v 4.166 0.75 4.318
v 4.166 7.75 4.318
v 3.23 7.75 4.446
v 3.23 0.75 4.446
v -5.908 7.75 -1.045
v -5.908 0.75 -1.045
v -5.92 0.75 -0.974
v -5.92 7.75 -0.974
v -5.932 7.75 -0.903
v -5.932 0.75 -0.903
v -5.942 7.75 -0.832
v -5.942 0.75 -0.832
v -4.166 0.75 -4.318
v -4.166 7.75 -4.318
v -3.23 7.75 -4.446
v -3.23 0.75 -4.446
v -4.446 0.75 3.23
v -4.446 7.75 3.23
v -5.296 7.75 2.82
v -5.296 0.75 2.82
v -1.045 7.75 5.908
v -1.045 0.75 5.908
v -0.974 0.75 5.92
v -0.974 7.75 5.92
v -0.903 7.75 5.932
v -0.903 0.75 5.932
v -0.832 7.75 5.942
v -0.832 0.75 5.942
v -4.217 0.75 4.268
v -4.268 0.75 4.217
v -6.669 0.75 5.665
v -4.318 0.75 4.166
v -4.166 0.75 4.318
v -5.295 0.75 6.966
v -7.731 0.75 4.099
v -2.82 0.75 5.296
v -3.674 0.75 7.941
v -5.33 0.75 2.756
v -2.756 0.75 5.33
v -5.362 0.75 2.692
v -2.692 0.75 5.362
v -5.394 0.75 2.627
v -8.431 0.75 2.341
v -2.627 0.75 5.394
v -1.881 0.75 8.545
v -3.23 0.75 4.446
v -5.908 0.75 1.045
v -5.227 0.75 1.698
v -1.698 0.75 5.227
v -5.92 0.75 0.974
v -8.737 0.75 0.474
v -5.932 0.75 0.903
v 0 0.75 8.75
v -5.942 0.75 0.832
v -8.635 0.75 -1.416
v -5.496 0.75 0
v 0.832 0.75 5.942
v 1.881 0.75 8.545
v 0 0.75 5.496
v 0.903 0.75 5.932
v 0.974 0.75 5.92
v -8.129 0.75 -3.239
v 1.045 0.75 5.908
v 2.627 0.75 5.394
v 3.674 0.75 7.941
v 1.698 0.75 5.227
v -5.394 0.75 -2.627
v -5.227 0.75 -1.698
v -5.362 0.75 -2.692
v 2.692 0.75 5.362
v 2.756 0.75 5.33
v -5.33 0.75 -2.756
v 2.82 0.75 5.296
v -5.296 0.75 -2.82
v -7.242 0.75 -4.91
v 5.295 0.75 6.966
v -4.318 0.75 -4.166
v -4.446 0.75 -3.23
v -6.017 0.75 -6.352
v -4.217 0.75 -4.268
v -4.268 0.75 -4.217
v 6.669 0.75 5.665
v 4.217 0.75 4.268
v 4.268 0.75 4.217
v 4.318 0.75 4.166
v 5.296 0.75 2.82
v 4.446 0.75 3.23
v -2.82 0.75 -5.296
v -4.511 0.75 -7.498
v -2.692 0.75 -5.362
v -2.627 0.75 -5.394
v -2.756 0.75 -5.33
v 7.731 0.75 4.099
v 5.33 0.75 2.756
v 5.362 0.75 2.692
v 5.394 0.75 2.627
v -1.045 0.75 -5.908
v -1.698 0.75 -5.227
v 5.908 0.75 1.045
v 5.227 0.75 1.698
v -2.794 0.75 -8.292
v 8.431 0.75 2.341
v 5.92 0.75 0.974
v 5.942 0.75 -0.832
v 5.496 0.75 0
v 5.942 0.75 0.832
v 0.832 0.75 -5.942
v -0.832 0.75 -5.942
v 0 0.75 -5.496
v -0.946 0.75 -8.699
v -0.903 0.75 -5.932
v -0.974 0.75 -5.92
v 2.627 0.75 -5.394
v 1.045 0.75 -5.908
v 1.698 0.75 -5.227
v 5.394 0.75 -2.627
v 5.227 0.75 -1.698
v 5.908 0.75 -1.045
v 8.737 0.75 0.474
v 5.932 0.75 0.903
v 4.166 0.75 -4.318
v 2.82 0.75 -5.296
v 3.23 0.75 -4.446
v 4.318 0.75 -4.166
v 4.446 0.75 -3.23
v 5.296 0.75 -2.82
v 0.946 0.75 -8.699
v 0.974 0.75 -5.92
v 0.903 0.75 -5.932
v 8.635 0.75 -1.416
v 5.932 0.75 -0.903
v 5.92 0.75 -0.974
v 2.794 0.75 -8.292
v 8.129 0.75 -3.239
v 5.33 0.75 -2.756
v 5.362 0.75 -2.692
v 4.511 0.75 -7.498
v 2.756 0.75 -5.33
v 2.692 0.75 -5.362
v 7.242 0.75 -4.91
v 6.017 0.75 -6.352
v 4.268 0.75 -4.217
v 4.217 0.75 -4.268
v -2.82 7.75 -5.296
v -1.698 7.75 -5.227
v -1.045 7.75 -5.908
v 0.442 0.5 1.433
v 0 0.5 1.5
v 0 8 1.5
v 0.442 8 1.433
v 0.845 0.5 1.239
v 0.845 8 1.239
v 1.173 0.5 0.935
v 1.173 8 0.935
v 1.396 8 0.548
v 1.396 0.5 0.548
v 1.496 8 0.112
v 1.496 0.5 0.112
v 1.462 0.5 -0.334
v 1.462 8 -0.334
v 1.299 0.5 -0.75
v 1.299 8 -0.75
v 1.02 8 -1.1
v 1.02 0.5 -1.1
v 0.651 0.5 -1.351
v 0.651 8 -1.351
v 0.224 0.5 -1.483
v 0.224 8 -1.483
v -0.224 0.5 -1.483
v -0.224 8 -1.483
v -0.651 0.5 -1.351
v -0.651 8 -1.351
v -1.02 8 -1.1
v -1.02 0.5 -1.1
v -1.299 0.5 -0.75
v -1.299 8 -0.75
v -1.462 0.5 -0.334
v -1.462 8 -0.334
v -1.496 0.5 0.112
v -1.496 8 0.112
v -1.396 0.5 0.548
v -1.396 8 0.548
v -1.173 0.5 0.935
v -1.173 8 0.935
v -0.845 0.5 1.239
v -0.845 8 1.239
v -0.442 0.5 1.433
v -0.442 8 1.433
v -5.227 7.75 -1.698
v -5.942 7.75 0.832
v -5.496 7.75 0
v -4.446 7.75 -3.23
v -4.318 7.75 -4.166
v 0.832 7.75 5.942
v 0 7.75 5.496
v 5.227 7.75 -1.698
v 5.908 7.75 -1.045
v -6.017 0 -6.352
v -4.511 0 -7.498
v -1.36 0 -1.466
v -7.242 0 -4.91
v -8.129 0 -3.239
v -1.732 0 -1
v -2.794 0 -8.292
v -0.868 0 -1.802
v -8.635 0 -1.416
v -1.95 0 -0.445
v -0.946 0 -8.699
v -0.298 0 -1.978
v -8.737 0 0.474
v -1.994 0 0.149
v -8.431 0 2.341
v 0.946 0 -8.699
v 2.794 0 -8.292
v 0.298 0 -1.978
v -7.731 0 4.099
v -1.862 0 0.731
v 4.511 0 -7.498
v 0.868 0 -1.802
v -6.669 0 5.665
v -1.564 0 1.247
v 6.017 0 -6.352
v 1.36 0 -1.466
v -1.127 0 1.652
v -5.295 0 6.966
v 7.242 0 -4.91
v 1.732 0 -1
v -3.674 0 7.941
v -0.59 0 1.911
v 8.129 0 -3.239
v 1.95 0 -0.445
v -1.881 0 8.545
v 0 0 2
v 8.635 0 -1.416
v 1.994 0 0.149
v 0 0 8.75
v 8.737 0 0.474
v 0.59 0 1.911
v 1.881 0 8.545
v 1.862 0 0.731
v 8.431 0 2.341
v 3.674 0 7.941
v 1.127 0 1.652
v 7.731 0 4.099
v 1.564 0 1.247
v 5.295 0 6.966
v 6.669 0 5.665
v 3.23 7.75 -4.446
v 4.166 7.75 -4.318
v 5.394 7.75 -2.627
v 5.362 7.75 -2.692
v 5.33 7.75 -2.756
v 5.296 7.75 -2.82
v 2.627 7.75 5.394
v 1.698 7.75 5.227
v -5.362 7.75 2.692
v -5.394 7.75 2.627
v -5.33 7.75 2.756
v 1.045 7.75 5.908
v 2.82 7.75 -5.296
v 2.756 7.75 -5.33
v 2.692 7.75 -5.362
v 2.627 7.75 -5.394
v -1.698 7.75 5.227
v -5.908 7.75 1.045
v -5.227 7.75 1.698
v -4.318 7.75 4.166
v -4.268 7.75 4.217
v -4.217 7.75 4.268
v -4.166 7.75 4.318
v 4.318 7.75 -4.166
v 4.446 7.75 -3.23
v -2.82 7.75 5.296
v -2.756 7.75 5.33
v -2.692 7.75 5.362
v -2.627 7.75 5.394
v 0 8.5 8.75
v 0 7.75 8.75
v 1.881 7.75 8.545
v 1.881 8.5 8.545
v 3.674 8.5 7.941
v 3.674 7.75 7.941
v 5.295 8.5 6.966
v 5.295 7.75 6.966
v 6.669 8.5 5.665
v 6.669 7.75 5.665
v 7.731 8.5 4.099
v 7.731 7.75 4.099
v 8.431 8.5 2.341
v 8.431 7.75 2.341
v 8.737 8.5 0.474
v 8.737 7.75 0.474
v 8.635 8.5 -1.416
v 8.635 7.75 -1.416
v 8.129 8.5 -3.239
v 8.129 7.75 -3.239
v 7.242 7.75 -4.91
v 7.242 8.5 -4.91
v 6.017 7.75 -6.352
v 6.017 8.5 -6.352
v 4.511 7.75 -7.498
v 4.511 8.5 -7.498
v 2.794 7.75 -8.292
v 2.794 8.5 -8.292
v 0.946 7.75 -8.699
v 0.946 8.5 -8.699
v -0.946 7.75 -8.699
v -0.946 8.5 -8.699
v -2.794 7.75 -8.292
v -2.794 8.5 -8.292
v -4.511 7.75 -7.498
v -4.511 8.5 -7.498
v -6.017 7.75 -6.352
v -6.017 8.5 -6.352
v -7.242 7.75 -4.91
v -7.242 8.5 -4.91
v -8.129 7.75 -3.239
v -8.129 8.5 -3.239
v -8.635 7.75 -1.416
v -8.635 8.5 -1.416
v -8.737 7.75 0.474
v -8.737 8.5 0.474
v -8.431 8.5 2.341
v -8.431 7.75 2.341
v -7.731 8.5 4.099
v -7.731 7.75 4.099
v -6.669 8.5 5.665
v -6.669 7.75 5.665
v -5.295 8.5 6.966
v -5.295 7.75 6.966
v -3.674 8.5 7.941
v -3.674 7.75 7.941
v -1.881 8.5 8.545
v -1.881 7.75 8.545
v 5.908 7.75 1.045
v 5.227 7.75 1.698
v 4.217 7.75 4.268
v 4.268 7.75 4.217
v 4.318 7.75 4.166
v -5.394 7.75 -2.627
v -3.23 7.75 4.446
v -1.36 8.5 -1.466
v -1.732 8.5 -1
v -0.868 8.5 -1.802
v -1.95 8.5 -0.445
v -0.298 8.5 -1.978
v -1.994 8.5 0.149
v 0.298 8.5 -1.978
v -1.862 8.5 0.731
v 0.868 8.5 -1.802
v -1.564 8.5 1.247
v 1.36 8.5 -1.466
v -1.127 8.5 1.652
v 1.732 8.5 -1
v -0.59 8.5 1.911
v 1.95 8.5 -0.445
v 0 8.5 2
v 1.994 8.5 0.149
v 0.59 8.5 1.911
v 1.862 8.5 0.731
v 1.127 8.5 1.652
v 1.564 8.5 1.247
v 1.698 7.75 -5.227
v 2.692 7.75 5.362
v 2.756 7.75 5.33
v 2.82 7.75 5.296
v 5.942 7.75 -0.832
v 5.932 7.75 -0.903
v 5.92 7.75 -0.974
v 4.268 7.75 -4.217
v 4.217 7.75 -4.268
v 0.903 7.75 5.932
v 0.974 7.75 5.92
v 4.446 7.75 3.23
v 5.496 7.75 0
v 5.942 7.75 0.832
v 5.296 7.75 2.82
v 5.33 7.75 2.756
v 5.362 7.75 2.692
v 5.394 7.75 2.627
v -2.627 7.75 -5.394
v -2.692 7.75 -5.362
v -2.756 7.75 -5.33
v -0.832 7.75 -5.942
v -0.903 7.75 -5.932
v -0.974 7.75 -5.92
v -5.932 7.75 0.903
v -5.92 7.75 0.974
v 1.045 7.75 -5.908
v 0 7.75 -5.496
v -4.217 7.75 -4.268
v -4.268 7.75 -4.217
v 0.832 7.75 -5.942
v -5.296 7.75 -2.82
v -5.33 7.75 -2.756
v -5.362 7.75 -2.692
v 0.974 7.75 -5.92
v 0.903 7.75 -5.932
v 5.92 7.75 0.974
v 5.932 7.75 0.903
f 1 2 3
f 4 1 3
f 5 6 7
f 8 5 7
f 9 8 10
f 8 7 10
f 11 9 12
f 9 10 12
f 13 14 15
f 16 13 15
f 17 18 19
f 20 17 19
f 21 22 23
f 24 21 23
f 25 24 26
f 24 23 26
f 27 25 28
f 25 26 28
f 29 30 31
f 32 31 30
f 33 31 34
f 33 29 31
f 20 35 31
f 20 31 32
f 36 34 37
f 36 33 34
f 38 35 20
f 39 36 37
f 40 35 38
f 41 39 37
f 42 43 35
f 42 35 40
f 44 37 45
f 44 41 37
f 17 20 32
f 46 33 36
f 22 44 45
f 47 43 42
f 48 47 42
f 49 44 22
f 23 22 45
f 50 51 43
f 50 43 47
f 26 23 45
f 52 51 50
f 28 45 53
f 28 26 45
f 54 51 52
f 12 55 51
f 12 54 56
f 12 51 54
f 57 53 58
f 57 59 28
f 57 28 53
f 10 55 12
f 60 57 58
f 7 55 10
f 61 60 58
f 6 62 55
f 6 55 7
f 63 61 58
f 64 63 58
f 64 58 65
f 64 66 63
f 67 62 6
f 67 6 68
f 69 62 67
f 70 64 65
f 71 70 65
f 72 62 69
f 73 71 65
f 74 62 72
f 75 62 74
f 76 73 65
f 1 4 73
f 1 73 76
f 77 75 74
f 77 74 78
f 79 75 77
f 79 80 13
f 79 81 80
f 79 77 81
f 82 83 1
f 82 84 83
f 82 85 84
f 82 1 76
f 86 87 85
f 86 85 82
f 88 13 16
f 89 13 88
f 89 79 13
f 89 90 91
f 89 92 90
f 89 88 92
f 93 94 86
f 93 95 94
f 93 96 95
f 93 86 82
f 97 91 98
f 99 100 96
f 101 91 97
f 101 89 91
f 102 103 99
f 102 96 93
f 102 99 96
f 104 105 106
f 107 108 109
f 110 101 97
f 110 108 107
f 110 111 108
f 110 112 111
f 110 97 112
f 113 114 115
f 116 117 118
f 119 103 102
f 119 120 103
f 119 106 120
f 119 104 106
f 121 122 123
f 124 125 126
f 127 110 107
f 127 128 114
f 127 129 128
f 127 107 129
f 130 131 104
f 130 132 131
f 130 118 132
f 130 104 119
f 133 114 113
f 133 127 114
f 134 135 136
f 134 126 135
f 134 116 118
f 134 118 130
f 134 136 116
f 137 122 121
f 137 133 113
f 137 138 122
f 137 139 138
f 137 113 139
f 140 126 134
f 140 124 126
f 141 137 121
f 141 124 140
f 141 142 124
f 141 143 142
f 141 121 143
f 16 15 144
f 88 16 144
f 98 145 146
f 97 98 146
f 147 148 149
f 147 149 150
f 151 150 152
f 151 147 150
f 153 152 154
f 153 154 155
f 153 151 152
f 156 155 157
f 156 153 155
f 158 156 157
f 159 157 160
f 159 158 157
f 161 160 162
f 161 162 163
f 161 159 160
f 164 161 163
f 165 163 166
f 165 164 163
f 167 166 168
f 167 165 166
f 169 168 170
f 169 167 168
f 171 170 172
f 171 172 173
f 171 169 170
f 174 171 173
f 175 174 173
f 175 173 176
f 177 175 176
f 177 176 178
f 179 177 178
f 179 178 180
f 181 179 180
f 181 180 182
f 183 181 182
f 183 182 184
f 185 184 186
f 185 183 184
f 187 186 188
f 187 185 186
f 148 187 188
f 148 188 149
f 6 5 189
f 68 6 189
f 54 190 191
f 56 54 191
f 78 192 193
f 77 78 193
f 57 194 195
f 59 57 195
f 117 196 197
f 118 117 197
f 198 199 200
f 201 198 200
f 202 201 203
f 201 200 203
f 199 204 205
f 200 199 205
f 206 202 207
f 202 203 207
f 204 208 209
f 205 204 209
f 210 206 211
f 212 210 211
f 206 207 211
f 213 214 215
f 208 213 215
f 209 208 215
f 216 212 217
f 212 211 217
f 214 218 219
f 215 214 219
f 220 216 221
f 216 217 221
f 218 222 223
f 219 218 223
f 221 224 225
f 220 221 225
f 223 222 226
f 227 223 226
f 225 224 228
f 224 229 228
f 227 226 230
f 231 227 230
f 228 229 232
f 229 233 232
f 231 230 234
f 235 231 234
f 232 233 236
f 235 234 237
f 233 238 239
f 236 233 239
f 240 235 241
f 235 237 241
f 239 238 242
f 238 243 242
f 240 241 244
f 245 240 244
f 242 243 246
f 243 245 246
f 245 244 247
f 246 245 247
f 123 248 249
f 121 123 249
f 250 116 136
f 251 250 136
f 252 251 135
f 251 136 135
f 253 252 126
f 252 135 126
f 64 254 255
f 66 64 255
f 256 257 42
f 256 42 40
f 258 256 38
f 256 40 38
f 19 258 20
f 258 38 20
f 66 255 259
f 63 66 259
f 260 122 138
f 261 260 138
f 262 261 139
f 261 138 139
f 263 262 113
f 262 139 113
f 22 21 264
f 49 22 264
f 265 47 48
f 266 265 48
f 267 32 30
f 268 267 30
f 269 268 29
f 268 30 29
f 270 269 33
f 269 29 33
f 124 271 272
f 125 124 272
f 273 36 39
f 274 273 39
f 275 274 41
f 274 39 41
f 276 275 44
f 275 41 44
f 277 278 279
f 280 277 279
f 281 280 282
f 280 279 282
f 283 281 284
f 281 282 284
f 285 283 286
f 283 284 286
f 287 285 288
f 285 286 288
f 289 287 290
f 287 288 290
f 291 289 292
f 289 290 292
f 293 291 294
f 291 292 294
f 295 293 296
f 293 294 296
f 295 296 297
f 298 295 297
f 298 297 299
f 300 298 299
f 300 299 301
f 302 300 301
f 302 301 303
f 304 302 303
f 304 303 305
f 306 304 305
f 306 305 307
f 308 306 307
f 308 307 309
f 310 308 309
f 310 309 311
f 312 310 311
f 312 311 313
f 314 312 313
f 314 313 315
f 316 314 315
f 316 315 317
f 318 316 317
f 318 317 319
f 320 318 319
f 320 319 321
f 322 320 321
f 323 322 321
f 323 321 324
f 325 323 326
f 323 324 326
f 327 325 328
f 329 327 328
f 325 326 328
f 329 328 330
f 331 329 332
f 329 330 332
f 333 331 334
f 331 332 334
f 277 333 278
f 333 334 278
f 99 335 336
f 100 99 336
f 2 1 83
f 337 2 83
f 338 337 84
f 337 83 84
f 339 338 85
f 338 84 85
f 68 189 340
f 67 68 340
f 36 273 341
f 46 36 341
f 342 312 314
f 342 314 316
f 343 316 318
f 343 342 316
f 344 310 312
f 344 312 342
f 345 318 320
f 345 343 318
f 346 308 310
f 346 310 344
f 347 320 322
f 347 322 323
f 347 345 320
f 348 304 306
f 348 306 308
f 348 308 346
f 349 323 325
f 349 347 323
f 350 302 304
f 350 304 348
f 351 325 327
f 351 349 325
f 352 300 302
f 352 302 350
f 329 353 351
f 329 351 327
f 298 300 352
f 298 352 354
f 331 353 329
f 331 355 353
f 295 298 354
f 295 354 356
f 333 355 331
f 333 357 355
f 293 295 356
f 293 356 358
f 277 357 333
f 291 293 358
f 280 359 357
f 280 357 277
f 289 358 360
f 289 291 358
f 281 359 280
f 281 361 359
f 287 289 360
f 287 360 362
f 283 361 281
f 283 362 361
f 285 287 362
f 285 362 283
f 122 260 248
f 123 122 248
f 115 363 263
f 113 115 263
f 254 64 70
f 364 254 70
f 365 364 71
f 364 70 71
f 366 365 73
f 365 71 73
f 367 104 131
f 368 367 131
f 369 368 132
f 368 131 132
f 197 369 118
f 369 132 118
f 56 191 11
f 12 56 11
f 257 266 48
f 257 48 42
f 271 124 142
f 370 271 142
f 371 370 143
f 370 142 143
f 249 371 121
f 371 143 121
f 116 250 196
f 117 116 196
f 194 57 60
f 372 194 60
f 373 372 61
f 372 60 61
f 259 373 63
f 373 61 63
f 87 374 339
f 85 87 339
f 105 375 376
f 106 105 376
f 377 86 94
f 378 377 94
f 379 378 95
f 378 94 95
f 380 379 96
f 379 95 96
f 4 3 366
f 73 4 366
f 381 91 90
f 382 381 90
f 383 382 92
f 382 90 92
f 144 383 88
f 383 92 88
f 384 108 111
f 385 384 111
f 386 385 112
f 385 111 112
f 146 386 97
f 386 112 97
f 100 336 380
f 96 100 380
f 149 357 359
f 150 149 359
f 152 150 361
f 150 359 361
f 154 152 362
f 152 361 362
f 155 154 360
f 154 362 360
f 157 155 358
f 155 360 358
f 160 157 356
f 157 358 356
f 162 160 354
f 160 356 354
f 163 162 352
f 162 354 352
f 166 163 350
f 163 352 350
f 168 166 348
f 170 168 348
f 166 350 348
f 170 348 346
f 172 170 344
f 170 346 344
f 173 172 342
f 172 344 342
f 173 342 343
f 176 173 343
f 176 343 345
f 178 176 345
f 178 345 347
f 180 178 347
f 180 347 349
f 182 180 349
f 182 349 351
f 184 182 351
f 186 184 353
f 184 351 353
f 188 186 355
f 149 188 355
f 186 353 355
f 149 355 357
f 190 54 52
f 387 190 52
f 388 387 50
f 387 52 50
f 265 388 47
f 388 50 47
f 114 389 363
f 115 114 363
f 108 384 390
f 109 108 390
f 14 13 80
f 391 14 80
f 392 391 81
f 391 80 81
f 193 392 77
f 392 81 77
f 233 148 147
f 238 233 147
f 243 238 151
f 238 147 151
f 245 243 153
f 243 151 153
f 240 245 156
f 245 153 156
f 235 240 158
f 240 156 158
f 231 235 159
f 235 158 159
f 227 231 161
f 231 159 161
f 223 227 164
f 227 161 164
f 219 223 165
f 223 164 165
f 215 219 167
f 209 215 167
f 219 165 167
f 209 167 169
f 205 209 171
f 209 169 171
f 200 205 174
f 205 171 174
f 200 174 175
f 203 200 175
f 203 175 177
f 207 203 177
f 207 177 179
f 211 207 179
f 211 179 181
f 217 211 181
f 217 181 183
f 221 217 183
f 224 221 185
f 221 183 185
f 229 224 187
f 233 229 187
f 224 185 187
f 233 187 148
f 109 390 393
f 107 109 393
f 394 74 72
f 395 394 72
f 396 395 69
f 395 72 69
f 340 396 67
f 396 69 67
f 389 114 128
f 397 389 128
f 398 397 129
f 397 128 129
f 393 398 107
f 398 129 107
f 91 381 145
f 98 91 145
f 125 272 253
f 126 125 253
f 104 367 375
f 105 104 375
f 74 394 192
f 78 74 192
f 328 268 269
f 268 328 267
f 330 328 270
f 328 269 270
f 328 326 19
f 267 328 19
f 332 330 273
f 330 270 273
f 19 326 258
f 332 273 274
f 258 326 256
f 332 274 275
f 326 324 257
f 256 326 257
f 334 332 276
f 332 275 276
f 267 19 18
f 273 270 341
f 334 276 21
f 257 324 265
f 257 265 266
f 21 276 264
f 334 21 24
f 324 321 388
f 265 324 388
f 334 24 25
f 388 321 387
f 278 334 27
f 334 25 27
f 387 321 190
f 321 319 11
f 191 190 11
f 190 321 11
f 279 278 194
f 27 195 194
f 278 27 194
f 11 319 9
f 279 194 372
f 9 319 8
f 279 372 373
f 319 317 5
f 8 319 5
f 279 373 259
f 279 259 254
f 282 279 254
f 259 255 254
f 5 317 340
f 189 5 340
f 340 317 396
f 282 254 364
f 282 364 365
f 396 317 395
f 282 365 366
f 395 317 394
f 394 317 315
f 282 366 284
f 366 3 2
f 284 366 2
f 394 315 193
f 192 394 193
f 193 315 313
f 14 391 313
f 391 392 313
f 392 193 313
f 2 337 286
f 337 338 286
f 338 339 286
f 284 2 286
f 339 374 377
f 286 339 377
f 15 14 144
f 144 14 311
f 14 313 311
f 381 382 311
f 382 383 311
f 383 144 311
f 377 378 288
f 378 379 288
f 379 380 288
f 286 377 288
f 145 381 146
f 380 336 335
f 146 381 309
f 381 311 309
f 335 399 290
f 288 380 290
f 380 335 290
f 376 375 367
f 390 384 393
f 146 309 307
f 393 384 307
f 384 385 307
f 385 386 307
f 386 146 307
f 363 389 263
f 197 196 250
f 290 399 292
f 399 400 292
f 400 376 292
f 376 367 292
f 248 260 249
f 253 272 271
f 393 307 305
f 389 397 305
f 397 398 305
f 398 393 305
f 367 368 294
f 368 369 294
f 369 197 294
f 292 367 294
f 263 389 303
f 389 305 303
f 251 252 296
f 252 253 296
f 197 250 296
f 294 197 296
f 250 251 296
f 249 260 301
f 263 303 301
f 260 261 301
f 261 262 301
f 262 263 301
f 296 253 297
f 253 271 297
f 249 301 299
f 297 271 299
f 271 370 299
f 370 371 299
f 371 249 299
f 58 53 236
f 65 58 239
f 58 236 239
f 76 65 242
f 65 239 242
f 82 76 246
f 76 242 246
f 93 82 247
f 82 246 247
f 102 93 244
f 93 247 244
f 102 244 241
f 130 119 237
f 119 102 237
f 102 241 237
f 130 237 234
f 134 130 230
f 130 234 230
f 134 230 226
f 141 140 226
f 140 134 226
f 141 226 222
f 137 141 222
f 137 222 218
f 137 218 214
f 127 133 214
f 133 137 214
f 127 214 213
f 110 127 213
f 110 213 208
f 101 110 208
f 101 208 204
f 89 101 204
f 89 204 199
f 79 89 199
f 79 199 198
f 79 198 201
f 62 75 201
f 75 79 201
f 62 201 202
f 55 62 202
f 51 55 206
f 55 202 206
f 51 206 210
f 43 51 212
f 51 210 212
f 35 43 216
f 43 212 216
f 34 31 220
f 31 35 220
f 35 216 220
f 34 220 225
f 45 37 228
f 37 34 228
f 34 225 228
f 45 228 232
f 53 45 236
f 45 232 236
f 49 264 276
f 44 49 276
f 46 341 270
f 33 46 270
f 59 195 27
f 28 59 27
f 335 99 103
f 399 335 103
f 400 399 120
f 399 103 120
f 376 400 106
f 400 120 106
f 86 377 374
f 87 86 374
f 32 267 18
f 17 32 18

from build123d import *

# Parameters (mm, degrees)
SKETCH1_R               = 8.75
SKETCH1_R_2             = 1.5
BOSS_EXTRUDE1_DEPTH     = 8.5
CUT_EXTRUDE2_DEPTH      = 3.5
CUT_EXTRUDE2_DEPTH_BACK = 3.5
CUT_EXTRUDE2_START      = -4.25
SKETCH2_R               = 9
SKETCH2_R_2             = 6
CUT_EXTRUDE5_START      = -0.75
CUT_EXTRUDE5_DEPTH      = 7
CHAMFER1_SIZE           = 0.5


with BuildPart() as part:
    # Sketch1 → Boss-Extrude1 (new body)
    with BuildSketch(Plane(origin=(0, 0, 0), x_dir=(1, 0, 0), z_dir=(0, 1, 0))):
        with Locations(Location((0, 0, 0), (0, 0, 270))):
            Circle(SKETCH1_R)
        with Locations(Location((0, 0, 0), (0, 0, 270))):
            Circle(SKETCH1_R_2, mode=Mode.SUBTRACT)
    extrude(amount=BOSS_EXTRUDE1_DEPTH)

    # Sketch2 → Cut-Extrude2 (cut, two sides: drawn at the far end of the back side and taken through both)
    with BuildSketch(Plane(origin=(0, 8.5, 0), x_dir=(1, 0, 0), z_dir=(0, 1, 0)).offset(CUT_EXTRUDE2_START - CUT_EXTRUDE2_DEPTH_BACK)):
        Circle(SKETCH2_R)
        with Locations(Location((0, 0, 0), (0, 0, 270))):
            Circle(SKETCH2_R_2, mode=Mode.SUBTRACT)
    extrude(amount=CUT_EXTRUDE2_DEPTH + CUT_EXTRUDE2_DEPTH_BACK, mode=Mode.SUBTRACT)

    # Sketch4 → Cut-Extrude5 (cut)
    with BuildSketch(Plane(origin=(0, 8.5, 0), x_dir=(1, 0, 0), z_dir=(0, 1, 0)).offset(CUT_EXTRUDE5_START)):
        with BuildLine():
            ThreePointArc((3.526710889, 4.85410242), (3.180827716, 5.087468432), (2.81956216, 5.296231606))
            Line((2.81956216, 5.296231606), (3.230259184, 4.44607034))
            Line((3.230259184, 4.44607034), (4.165722957, 4.318188538))
            ThreePointArc((4.165722957, 4.318188538), (3.855539591, 4.597261626), (3.526710889, 4.85410242))
        make_face()
        with BuildLine():
            ThreePointArc((4.854101297, 3.526712434), (4.597261012, 3.855540323), (4.318188538, 4.165722957))
            Line((4.318188538, 4.165722957), (4.44607034, 3.230259184))
            Line((4.44607034, 3.230259184), (5.296231606, 2.81956216))
            ThreePointArc((5.296231606, 2.81956216), (5.087467925, 3.180828525), (4.854101297, 3.526712434))
        make_face()
        with BuildLine():
            ThreePointArc((1.85410212, 5.706339048), (1.453033176, 5.821399711), (1.044937393, 5.908308205))
            Line((1.044937393, 5.908308205), (1.698247753, 5.226669153))
            Line((1.698247753, 5.226669153), (2.62744432, 5.394120535))
            ThreePointArc((2.62744432, 5.394120535), (2.246204515, 5.563682708), (1.85410212, 5.706339048))
        make_face()
        with BuildLine():
            ThreePointArc((0.831973127, 5.942038431), (0.416994825, 5.98549207), (-5.4e-08, 6))
            ThreePointArc((-5.4e-08, 6), (-0.416994879, 5.985492066), (-0.831973127, 5.942038431))
            Line((-0.831973127, 5.942038431), (0, 5.495645173))
            Line((0, 5.495645173), (0.831973127, 5.942038431))
        make_face()
        with BuildLine():
            Line((-1.698247753, 5.226669153), (-1.044937393, 5.908308205))
            ThreePointArc((-1.044937393, 5.908308205), (-1.453033133, 5.821399721), (-1.854102038, 5.706339075))
            ThreePointArc((-1.854102038, 5.706339075), (-2.246204475, 5.563682724), (-2.62744432, 5.394120535))
            Line((-2.62744432, 5.394120535), (-1.698247753, 5.226669153))
        make_face()
        with BuildLine():
            Line((-3.230259184, 4.44607034), (-2.81956216, 5.296231606))
            ThreePointArc((-2.81956216, 5.296231606), (-3.180828024, 5.087468239), (-3.526711477, 4.854101993))
            ThreePointArc((-3.526711477, 4.854101993), (-3.85553987, 4.597261392), (-4.165722957, 4.318188538))
            Line((-4.165722957, 4.318188538), (-3.230259184, 4.44607034))
        make_face()
        with BuildLine():
            Line((-4.44607034, 3.230259184), (-4.318188538, 4.165722957))
            ThreePointArc((-4.318188538, 4.165722957), (-4.597261623, 3.855539595), (-4.854102415, 3.526710897))
            ThreePointArc((-4.854102415, 3.526710897), (-5.087468429, 3.18082772), (-5.296231606, 2.81956216))
            Line((-5.296231606, 2.81956216), (-4.44607034, 3.230259184))
        make_face()
        with BuildLine():
            Line((-5.226669153, 1.698247753), (-5.394120535, 2.62744432))
            ThreePointArc((-5.394120535, 2.62744432), (-5.563682526, 2.246204966), (-5.706338747, 1.854103044))
            ThreePointArc((-5.706338747, 1.854103044), (-5.821399593, 1.453033647), (-5.908308205, 1.044937393))
            Line((-5.908308205, 1.044937393), (-5.226669153, 1.698247753))
        make_face()
        with BuildLine():
            ThreePointArc((5.70633865, 1.854103345), (5.563682467, 2.246205112), (5.394120535, 2.62744432))
            Line((5.394120535, 2.62744432), (5.226669153, 1.698247753))
            Line((5.226669153, 1.698247753), (5.908308205, 1.044937393))
            ThreePointArc((5.908308205, 1.044937393), (5.821399555, 1.4530338), (5.70633865, 1.854103345))
        make_face()
        with BuildLine():
            ThreePointArc((6, 0), (5.985492068, 0.416994852), (5.942038431, 0.831973127))
            Line((5.942038431, 0.831973127), (5.495645173, 0))
            Line((5.495645173, 0), (5.942038431, -0.831973127))
            ThreePointArc((5.942038431, -0.831973127), (5.985492068, -0.416994852), (6, 0))
        make_face()
        with BuildLine():
            ThreePointArc((5.706339698, -1.854100118), (5.821399966, -1.453032154), (5.908308205, -1.044937393))
            Line((5.908308205, -1.044937393), (5.226669153, -1.698247753))
            Line((5.226669153, -1.698247753), (5.394120535, -2.62744432))
            ThreePointArc((5.394120535, -2.62744432), (5.563683102, -2.246203539), (5.706339698, -1.854100118))
        make_face()
        with BuildLine():
            Line((-5.495645173, 0), (-5.942038431, 0.831973127))
            ThreePointArc((-5.942038431, 0.831973127), (-5.985492068, 0.416994852), (-6, 0))
            ThreePointArc((-6, 0), (-5.985492068, -0.416994852), (-5.942038431, -0.831973127))
            Line((-5.942038431, -0.831973127), (-5.495645173, 0))
        make_face()
        with BuildLine():
            Line((-4.44607034, -3.230259184), (-5.296231606, -2.81956216))
            ThreePointArc((-5.296231606, -2.81956216), (-5.087467714, -3.180828864), (-4.854100828, -3.526713081))
            ThreePointArc((-4.854100828, -3.526713081), (-4.597260756, -3.855540629), (-4.318188538, -4.165722957))
            Line((-4.318188538, -4.165722957), (-4.44607034, -3.230259184))
        make_face()
        with BuildLine():
            Line((-3.230259184, -4.44607034), (-4.165722957, -4.318188538))
            ThreePointArc((-4.165722957, -4.318188538), (-3.855540695, -4.5972607), (-3.52671322, -4.854100727))
            ThreePointArc((-3.52671322, -4.854100727), (-3.180828937, -5.087467668), (-2.81956216, -5.296231606))
            Line((-2.81956216, -5.296231606), (-3.230259184, -4.44607034))
        make_face()
        with BuildLine():
            Line((-1.698247753, -5.226669153), (-2.62744432, -5.394120535))
            ThreePointArc((-2.62744432, -5.394120535), (-2.246203408, -5.563683155), (-1.854099848, -5.706339786))
            ThreePointArc((-1.854099848, -5.706339786), (-1.453032017, -5.8214), (-1.044937393, -5.908308205))
            Line((-1.044937393, -5.908308205), (-1.698247753, -5.226669153))
        make_face()
        with BuildLine():
            Line((0, -5.495645173), (-0.831973127, -5.942038431))
            ThreePointArc((-0.831973127, -5.942038431), (-0.416994852, -5.985492068), (1e-09, -6))
            ThreePointArc((1e-09, -6), (0.416994853, -5.985492068), (0.831973127, -5.942038431))
            Line((0.831973127, -5.942038431), (0, -5.495645173))
        make_face()
        with BuildLine():
            ThreePointArc((1.854099793, -5.706339804), (2.246203381, -5.563683166), (2.62744432, -5.394120535))
            Line((2.62744432, -5.394120535), (1.698247753, -5.226669153))
            Line((1.698247753, -5.226669153), (1.044937393, -5.908308205))
            ThreePointArc((1.044937393, -5.908308205), (1.453031988, -5.821400007), (1.854099793, -5.706339804))
        make_face()
        with BuildLine():
            ThreePointArc((3.526713316, -4.854100657), (3.855540741, -4.597260662), (4.165722957, -4.318188538))
            Line((4.165722957, -4.318188538), (3.230259184, -4.44607034))
            Line((3.230259184, -4.44607034), (2.81956216, -5.296231606))
            ThreePointArc((2.81956216, -5.296231606), (3.180828987, -5.087467637), (3.526713316, -4.854100657))
        make_face()
        with BuildLine():
            ThreePointArc((4.854100726, -3.52671322), (5.087467668, -3.180828937), (5.296231606, -2.81956216))
            Line((5.296231606, -2.81956216), (4.44607034, -3.230259184))
            Line((4.44607034, -3.230259184), (4.318188538, -4.165722957))
            ThreePointArc((4.318188538, -4.165722957), (4.5972607, -3.855540695), (4.854100726, -3.52671322))
        make_face()
        Polygon((-5.226669153, -1.698247753), (-5.415863123, -2.748095092), (-5.996815072, -0.960108841), align=None)
    extrude(amount=-CUT_EXTRUDE5_DEPTH, mode=Mode.SUBTRACT)

    # Chamfer1
    chamfer1_edges = [part.edges().sort_by_distance(p)[0] for p in [
        (0, 0, -1.5),
        (0, 8.5, -1.5),
    ]]
    chamfer(chamfer1_edges, length=CHAMFER1_SIZE)


solid = part.part
